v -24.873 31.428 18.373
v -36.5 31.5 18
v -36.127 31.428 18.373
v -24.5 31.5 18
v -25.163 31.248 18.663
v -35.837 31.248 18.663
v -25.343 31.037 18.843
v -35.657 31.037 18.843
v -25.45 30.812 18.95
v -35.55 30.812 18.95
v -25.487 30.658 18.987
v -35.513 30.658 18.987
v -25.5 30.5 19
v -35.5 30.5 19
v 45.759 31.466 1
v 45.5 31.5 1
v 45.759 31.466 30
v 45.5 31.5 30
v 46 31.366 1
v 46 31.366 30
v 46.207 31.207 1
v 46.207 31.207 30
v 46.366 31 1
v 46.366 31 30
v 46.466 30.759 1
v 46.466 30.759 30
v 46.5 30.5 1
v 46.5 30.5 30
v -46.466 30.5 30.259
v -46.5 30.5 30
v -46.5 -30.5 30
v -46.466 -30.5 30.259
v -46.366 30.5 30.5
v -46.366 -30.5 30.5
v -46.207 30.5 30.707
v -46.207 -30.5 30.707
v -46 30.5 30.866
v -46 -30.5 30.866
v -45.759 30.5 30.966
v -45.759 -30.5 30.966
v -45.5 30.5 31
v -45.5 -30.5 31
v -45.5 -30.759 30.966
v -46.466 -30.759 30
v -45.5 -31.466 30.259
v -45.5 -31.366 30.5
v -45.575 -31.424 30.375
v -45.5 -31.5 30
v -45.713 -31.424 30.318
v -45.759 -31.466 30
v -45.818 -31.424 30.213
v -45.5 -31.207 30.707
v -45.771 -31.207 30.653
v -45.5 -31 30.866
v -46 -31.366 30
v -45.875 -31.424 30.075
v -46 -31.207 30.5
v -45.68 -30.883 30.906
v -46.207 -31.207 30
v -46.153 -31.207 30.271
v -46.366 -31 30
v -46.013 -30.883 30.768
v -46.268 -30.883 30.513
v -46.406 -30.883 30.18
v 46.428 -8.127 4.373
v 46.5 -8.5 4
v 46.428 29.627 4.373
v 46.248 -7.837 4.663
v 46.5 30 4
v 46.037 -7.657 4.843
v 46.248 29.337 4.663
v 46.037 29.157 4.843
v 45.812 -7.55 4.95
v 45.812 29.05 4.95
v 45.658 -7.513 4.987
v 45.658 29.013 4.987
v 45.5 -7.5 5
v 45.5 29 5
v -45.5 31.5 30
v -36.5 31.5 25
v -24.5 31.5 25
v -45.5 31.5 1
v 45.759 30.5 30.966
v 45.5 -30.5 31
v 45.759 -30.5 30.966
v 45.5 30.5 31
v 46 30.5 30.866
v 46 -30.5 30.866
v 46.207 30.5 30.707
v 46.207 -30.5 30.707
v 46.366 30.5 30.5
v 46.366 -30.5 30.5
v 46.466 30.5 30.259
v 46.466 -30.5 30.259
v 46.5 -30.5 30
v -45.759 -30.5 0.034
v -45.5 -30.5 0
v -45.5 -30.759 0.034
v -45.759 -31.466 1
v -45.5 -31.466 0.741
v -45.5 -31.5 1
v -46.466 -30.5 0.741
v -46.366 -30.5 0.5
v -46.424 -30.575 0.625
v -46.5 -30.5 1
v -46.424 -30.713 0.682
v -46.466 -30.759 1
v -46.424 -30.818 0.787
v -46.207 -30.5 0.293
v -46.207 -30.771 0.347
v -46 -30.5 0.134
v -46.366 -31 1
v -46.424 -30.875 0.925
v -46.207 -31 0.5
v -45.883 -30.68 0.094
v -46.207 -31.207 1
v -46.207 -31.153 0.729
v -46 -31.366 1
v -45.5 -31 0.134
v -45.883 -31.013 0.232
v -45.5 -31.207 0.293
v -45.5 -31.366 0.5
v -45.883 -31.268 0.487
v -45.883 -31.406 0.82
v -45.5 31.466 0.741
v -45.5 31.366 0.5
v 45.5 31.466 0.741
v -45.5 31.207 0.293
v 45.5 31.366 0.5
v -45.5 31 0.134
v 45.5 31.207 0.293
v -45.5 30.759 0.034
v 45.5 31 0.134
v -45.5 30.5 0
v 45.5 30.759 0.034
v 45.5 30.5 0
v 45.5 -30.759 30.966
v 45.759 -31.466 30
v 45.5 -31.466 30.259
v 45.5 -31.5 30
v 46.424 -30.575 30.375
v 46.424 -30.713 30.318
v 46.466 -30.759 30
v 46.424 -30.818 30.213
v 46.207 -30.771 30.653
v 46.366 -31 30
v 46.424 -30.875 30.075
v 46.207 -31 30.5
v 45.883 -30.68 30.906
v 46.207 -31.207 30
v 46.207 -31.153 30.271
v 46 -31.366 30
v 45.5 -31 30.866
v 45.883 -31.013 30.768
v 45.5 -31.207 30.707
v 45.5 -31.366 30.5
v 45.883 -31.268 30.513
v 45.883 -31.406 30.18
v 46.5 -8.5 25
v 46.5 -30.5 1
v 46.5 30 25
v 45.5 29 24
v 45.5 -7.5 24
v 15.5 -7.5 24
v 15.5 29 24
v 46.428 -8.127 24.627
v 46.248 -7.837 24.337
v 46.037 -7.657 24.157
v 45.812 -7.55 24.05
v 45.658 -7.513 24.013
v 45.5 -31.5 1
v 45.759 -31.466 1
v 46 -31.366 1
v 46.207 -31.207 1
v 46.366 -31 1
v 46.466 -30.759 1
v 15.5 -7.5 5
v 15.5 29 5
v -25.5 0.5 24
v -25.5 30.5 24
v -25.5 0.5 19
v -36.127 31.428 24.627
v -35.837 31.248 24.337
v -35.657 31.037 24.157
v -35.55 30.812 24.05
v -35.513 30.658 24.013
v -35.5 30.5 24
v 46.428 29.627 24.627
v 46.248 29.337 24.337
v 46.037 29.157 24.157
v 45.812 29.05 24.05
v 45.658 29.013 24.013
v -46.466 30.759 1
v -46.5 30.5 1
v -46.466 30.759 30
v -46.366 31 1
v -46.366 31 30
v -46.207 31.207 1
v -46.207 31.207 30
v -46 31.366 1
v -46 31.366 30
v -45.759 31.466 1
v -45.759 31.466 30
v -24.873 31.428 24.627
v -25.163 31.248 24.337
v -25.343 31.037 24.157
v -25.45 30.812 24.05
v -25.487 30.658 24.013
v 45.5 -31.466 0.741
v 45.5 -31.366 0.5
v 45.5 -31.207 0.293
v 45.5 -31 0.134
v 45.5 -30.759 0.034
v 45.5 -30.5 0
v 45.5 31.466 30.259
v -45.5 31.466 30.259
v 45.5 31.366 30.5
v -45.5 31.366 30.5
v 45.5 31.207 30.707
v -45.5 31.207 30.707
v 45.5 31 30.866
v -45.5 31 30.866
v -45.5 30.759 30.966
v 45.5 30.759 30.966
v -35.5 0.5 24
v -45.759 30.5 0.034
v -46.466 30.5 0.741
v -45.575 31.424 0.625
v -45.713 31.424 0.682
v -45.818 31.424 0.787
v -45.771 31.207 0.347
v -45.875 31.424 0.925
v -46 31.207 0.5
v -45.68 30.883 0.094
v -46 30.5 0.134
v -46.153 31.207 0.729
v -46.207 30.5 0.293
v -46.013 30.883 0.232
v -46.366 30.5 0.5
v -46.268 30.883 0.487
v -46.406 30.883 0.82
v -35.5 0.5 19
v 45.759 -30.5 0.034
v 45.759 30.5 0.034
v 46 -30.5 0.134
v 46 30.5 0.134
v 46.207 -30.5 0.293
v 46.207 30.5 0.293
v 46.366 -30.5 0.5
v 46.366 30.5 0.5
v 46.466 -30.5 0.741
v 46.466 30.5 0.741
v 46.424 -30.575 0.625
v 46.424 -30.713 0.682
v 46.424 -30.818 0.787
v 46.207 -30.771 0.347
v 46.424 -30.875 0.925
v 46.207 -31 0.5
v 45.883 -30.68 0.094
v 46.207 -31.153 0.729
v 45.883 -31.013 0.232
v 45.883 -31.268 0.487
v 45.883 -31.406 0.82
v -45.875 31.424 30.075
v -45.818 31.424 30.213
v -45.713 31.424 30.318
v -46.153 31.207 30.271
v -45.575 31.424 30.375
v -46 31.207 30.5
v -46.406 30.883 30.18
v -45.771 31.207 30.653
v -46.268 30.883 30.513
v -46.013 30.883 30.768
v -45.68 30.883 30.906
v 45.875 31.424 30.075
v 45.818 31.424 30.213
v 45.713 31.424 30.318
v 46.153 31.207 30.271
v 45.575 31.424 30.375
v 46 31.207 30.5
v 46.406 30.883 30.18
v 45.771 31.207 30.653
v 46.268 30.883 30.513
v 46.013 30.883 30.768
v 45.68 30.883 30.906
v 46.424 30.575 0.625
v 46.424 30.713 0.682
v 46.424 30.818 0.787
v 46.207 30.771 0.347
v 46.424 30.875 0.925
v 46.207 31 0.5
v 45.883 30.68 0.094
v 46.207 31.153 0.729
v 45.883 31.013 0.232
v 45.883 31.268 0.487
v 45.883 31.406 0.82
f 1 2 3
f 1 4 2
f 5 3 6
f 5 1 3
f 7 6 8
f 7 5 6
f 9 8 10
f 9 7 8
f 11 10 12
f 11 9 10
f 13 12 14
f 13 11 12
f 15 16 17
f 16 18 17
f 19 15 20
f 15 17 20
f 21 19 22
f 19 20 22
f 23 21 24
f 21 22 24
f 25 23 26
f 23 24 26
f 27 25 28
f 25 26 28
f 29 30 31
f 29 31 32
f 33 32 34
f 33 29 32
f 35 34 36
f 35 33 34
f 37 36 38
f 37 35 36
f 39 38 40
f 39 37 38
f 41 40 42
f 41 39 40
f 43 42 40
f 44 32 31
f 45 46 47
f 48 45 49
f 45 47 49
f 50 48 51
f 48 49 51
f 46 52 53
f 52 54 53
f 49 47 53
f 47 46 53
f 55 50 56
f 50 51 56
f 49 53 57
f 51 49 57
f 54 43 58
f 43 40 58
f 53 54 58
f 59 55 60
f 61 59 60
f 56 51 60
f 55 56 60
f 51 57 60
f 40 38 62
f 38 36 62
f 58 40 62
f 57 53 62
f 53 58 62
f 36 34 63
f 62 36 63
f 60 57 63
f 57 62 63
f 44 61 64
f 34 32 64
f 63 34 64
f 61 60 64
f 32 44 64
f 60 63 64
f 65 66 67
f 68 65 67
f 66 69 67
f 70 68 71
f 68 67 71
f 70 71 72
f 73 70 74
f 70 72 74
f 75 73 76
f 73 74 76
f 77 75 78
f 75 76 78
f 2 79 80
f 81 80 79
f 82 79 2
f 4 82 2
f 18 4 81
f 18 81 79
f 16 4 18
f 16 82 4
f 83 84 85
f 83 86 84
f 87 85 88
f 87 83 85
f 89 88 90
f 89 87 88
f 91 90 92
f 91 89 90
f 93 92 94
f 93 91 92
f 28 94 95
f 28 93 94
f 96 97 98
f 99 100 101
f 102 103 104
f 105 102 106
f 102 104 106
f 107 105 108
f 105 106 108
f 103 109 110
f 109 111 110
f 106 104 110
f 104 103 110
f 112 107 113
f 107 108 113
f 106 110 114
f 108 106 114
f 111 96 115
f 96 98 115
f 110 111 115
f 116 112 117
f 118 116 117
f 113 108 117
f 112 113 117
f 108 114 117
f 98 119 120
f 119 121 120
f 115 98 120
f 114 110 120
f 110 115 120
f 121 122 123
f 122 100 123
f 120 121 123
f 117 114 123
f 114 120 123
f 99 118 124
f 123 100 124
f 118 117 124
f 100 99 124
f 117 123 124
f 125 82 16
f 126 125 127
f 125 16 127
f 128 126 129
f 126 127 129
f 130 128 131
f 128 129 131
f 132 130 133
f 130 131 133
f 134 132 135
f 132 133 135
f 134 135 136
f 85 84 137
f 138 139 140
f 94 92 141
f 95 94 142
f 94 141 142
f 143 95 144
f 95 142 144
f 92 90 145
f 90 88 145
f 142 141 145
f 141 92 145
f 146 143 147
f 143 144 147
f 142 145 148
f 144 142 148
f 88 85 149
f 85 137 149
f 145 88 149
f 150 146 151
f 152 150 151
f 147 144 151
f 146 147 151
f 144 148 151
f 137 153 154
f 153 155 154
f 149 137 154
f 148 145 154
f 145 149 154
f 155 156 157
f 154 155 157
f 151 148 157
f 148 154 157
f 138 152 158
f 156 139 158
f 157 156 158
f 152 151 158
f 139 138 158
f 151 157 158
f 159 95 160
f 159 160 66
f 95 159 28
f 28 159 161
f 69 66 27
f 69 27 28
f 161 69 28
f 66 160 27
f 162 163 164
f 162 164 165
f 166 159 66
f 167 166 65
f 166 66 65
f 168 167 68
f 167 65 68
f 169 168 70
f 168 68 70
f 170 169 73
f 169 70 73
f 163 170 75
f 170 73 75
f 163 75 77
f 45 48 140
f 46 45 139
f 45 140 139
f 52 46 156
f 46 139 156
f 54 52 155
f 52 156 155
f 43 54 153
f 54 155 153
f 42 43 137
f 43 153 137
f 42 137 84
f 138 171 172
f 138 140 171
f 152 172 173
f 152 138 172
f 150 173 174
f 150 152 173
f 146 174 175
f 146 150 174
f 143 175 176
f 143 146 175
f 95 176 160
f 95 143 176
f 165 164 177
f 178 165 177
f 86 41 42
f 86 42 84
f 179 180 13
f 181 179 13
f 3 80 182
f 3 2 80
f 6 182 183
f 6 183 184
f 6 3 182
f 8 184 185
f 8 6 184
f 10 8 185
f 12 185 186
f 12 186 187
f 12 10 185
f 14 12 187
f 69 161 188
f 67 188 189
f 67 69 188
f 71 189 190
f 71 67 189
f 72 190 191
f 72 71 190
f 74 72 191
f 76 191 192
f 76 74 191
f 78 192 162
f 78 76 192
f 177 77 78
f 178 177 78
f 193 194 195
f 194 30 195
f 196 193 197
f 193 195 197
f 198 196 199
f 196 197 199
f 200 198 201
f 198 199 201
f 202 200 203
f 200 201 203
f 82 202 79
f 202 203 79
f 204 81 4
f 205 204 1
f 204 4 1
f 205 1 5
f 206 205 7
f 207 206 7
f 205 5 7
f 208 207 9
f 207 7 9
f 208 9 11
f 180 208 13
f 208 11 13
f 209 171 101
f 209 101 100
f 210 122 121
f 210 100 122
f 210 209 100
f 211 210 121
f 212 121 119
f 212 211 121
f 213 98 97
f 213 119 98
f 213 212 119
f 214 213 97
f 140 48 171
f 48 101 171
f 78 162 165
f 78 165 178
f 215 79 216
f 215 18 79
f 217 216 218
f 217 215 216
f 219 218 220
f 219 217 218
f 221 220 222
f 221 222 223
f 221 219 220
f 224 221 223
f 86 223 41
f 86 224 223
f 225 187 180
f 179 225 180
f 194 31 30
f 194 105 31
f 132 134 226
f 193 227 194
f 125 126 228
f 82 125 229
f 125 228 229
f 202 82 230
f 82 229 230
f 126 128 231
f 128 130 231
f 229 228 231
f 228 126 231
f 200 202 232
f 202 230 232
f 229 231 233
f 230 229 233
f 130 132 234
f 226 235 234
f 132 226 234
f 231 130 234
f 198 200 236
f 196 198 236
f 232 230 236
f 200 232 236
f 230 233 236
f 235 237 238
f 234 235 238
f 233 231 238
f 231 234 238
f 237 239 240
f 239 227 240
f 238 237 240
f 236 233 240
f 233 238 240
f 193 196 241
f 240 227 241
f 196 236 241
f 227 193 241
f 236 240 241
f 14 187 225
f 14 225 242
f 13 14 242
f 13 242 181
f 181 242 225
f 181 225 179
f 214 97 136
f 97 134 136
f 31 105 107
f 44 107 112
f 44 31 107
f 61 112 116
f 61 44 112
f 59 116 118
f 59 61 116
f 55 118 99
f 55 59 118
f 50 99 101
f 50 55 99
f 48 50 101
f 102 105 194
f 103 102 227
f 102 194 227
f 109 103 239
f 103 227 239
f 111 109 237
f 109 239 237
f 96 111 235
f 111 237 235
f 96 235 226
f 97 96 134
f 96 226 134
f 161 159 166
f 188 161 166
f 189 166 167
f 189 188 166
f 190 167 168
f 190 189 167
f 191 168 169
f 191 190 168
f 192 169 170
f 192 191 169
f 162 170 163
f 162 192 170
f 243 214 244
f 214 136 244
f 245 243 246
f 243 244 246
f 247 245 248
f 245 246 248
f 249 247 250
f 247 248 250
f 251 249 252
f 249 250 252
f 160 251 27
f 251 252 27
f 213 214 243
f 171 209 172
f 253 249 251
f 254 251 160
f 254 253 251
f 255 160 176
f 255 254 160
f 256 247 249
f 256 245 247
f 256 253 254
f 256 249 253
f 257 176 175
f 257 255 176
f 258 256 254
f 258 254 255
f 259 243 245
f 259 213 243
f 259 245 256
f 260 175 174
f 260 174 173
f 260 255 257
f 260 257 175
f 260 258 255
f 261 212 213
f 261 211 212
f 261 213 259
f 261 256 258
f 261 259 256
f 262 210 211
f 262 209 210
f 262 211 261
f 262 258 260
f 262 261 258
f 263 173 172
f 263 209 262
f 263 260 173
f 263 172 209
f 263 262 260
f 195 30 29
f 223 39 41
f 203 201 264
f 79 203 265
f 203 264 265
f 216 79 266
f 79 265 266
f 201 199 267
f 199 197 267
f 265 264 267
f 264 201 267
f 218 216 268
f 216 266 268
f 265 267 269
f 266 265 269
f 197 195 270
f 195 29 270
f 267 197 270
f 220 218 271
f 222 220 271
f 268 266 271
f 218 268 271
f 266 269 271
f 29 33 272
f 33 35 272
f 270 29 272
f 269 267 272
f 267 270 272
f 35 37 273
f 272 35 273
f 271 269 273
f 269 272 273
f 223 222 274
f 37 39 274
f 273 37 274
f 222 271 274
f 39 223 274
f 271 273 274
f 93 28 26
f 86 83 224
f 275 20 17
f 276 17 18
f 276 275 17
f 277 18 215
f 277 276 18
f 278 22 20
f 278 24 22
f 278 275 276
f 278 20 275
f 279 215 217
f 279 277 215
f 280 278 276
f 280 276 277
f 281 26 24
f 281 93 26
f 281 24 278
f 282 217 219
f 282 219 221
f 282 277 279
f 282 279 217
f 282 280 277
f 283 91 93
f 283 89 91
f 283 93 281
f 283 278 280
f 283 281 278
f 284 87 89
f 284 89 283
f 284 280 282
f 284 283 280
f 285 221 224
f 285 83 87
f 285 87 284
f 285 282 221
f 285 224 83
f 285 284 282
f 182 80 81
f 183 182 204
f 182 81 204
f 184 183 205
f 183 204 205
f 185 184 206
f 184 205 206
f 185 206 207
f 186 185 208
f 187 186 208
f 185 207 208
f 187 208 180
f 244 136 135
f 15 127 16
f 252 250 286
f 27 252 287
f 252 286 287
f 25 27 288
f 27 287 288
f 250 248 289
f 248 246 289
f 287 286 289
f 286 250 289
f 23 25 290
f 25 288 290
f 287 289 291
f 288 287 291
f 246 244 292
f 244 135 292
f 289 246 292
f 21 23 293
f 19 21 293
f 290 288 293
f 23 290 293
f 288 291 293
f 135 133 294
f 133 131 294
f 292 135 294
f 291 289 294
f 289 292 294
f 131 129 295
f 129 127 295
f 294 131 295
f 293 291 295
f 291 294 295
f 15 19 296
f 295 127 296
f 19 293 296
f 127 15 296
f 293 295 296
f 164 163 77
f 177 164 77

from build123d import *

# Parameters (mm, degrees)
SKETCH1_W           = 93
SKETCH1_H           = 63
BOSS_EXTRUDE1_DEPTH = 31
SKETCH2_W           = 19
SKETCH2_H           = 36.5
CUT_EXTRUDE1_DEPTH  = 31
SKETCH3_W           = 10
SKETCH3_H           = 5
CUT_EXTRUDE2_DEPTH  = 31
FILLET1_R           = 1


with BuildPart() as part:
    # Sketch1 → Boss-Extrude1 (new body)
    with BuildSketch(Plane.XY):
        Rectangle(SKETCH1_W, SKETCH1_H)
    extrude(amount=BOSS_EXTRUDE1_DEPTH)

    # Sketch2 → Cut-Extrude1 (cut)
    with BuildSketch(Plane(origin=(46.5, 0, 0), x_dir=(0, 0, -1), z_dir=(1, 0, 0))):
        with Locations((-14.5, 10.75)):
            Rectangle(SKETCH2_W, SKETCH2_H)
    extrude(amount=-CUT_EXTRUDE1_DEPTH, mode=Mode.SUBTRACT)

    # Sketch3 → Cut-Extrude2 (cut)
    with BuildSketch(Plane(origin=(0, 31.5, 0), x_dir=(1, 0, 0), z_dir=(0, 1, 0))):
        with Locations((-30.5, -21.5)):
            Rectangle(SKETCH3_W, SKETCH3_H)
    extrude(amount=-CUT_EXTRUDE2_DEPTH, mode=Mode.SUBTRACT)

    # Fillet1
    fillet1_edges = [part.edges().sort_by_distance(p)[0] for p in [
        (-46.5, 0, 31),
        (0, -31.5, 31),
        (46.5, 10.75, 24),
        (46.5, -7.5, 14.5),
        (46.5, 10.75, 5),
        (46.5, 29, 14.5),
        (-35.5, 31.5, 21.5),
        (-30.5, 31.5, 24),
        (-25.5, 31.5, 21.5),
        (-30.5, 31.5, 19),
        (46.5, 0, 31),
        (0, -31.5, 0),
        (-46.5, 0, 0),
        (0, 31.5, 0),
        (46.5, 0, 0),
        (46.5, -31.5, 15.5),
        (-46.5, -31.5, 15.5),
        (-46.5, 31.5, 15.5),
        (46.5, 31.5, 15.5),
        (0, 31.5, 31),
    ]]
    fillet(fillet1_edges, radius=FILLET1_R)


solid = part.part
